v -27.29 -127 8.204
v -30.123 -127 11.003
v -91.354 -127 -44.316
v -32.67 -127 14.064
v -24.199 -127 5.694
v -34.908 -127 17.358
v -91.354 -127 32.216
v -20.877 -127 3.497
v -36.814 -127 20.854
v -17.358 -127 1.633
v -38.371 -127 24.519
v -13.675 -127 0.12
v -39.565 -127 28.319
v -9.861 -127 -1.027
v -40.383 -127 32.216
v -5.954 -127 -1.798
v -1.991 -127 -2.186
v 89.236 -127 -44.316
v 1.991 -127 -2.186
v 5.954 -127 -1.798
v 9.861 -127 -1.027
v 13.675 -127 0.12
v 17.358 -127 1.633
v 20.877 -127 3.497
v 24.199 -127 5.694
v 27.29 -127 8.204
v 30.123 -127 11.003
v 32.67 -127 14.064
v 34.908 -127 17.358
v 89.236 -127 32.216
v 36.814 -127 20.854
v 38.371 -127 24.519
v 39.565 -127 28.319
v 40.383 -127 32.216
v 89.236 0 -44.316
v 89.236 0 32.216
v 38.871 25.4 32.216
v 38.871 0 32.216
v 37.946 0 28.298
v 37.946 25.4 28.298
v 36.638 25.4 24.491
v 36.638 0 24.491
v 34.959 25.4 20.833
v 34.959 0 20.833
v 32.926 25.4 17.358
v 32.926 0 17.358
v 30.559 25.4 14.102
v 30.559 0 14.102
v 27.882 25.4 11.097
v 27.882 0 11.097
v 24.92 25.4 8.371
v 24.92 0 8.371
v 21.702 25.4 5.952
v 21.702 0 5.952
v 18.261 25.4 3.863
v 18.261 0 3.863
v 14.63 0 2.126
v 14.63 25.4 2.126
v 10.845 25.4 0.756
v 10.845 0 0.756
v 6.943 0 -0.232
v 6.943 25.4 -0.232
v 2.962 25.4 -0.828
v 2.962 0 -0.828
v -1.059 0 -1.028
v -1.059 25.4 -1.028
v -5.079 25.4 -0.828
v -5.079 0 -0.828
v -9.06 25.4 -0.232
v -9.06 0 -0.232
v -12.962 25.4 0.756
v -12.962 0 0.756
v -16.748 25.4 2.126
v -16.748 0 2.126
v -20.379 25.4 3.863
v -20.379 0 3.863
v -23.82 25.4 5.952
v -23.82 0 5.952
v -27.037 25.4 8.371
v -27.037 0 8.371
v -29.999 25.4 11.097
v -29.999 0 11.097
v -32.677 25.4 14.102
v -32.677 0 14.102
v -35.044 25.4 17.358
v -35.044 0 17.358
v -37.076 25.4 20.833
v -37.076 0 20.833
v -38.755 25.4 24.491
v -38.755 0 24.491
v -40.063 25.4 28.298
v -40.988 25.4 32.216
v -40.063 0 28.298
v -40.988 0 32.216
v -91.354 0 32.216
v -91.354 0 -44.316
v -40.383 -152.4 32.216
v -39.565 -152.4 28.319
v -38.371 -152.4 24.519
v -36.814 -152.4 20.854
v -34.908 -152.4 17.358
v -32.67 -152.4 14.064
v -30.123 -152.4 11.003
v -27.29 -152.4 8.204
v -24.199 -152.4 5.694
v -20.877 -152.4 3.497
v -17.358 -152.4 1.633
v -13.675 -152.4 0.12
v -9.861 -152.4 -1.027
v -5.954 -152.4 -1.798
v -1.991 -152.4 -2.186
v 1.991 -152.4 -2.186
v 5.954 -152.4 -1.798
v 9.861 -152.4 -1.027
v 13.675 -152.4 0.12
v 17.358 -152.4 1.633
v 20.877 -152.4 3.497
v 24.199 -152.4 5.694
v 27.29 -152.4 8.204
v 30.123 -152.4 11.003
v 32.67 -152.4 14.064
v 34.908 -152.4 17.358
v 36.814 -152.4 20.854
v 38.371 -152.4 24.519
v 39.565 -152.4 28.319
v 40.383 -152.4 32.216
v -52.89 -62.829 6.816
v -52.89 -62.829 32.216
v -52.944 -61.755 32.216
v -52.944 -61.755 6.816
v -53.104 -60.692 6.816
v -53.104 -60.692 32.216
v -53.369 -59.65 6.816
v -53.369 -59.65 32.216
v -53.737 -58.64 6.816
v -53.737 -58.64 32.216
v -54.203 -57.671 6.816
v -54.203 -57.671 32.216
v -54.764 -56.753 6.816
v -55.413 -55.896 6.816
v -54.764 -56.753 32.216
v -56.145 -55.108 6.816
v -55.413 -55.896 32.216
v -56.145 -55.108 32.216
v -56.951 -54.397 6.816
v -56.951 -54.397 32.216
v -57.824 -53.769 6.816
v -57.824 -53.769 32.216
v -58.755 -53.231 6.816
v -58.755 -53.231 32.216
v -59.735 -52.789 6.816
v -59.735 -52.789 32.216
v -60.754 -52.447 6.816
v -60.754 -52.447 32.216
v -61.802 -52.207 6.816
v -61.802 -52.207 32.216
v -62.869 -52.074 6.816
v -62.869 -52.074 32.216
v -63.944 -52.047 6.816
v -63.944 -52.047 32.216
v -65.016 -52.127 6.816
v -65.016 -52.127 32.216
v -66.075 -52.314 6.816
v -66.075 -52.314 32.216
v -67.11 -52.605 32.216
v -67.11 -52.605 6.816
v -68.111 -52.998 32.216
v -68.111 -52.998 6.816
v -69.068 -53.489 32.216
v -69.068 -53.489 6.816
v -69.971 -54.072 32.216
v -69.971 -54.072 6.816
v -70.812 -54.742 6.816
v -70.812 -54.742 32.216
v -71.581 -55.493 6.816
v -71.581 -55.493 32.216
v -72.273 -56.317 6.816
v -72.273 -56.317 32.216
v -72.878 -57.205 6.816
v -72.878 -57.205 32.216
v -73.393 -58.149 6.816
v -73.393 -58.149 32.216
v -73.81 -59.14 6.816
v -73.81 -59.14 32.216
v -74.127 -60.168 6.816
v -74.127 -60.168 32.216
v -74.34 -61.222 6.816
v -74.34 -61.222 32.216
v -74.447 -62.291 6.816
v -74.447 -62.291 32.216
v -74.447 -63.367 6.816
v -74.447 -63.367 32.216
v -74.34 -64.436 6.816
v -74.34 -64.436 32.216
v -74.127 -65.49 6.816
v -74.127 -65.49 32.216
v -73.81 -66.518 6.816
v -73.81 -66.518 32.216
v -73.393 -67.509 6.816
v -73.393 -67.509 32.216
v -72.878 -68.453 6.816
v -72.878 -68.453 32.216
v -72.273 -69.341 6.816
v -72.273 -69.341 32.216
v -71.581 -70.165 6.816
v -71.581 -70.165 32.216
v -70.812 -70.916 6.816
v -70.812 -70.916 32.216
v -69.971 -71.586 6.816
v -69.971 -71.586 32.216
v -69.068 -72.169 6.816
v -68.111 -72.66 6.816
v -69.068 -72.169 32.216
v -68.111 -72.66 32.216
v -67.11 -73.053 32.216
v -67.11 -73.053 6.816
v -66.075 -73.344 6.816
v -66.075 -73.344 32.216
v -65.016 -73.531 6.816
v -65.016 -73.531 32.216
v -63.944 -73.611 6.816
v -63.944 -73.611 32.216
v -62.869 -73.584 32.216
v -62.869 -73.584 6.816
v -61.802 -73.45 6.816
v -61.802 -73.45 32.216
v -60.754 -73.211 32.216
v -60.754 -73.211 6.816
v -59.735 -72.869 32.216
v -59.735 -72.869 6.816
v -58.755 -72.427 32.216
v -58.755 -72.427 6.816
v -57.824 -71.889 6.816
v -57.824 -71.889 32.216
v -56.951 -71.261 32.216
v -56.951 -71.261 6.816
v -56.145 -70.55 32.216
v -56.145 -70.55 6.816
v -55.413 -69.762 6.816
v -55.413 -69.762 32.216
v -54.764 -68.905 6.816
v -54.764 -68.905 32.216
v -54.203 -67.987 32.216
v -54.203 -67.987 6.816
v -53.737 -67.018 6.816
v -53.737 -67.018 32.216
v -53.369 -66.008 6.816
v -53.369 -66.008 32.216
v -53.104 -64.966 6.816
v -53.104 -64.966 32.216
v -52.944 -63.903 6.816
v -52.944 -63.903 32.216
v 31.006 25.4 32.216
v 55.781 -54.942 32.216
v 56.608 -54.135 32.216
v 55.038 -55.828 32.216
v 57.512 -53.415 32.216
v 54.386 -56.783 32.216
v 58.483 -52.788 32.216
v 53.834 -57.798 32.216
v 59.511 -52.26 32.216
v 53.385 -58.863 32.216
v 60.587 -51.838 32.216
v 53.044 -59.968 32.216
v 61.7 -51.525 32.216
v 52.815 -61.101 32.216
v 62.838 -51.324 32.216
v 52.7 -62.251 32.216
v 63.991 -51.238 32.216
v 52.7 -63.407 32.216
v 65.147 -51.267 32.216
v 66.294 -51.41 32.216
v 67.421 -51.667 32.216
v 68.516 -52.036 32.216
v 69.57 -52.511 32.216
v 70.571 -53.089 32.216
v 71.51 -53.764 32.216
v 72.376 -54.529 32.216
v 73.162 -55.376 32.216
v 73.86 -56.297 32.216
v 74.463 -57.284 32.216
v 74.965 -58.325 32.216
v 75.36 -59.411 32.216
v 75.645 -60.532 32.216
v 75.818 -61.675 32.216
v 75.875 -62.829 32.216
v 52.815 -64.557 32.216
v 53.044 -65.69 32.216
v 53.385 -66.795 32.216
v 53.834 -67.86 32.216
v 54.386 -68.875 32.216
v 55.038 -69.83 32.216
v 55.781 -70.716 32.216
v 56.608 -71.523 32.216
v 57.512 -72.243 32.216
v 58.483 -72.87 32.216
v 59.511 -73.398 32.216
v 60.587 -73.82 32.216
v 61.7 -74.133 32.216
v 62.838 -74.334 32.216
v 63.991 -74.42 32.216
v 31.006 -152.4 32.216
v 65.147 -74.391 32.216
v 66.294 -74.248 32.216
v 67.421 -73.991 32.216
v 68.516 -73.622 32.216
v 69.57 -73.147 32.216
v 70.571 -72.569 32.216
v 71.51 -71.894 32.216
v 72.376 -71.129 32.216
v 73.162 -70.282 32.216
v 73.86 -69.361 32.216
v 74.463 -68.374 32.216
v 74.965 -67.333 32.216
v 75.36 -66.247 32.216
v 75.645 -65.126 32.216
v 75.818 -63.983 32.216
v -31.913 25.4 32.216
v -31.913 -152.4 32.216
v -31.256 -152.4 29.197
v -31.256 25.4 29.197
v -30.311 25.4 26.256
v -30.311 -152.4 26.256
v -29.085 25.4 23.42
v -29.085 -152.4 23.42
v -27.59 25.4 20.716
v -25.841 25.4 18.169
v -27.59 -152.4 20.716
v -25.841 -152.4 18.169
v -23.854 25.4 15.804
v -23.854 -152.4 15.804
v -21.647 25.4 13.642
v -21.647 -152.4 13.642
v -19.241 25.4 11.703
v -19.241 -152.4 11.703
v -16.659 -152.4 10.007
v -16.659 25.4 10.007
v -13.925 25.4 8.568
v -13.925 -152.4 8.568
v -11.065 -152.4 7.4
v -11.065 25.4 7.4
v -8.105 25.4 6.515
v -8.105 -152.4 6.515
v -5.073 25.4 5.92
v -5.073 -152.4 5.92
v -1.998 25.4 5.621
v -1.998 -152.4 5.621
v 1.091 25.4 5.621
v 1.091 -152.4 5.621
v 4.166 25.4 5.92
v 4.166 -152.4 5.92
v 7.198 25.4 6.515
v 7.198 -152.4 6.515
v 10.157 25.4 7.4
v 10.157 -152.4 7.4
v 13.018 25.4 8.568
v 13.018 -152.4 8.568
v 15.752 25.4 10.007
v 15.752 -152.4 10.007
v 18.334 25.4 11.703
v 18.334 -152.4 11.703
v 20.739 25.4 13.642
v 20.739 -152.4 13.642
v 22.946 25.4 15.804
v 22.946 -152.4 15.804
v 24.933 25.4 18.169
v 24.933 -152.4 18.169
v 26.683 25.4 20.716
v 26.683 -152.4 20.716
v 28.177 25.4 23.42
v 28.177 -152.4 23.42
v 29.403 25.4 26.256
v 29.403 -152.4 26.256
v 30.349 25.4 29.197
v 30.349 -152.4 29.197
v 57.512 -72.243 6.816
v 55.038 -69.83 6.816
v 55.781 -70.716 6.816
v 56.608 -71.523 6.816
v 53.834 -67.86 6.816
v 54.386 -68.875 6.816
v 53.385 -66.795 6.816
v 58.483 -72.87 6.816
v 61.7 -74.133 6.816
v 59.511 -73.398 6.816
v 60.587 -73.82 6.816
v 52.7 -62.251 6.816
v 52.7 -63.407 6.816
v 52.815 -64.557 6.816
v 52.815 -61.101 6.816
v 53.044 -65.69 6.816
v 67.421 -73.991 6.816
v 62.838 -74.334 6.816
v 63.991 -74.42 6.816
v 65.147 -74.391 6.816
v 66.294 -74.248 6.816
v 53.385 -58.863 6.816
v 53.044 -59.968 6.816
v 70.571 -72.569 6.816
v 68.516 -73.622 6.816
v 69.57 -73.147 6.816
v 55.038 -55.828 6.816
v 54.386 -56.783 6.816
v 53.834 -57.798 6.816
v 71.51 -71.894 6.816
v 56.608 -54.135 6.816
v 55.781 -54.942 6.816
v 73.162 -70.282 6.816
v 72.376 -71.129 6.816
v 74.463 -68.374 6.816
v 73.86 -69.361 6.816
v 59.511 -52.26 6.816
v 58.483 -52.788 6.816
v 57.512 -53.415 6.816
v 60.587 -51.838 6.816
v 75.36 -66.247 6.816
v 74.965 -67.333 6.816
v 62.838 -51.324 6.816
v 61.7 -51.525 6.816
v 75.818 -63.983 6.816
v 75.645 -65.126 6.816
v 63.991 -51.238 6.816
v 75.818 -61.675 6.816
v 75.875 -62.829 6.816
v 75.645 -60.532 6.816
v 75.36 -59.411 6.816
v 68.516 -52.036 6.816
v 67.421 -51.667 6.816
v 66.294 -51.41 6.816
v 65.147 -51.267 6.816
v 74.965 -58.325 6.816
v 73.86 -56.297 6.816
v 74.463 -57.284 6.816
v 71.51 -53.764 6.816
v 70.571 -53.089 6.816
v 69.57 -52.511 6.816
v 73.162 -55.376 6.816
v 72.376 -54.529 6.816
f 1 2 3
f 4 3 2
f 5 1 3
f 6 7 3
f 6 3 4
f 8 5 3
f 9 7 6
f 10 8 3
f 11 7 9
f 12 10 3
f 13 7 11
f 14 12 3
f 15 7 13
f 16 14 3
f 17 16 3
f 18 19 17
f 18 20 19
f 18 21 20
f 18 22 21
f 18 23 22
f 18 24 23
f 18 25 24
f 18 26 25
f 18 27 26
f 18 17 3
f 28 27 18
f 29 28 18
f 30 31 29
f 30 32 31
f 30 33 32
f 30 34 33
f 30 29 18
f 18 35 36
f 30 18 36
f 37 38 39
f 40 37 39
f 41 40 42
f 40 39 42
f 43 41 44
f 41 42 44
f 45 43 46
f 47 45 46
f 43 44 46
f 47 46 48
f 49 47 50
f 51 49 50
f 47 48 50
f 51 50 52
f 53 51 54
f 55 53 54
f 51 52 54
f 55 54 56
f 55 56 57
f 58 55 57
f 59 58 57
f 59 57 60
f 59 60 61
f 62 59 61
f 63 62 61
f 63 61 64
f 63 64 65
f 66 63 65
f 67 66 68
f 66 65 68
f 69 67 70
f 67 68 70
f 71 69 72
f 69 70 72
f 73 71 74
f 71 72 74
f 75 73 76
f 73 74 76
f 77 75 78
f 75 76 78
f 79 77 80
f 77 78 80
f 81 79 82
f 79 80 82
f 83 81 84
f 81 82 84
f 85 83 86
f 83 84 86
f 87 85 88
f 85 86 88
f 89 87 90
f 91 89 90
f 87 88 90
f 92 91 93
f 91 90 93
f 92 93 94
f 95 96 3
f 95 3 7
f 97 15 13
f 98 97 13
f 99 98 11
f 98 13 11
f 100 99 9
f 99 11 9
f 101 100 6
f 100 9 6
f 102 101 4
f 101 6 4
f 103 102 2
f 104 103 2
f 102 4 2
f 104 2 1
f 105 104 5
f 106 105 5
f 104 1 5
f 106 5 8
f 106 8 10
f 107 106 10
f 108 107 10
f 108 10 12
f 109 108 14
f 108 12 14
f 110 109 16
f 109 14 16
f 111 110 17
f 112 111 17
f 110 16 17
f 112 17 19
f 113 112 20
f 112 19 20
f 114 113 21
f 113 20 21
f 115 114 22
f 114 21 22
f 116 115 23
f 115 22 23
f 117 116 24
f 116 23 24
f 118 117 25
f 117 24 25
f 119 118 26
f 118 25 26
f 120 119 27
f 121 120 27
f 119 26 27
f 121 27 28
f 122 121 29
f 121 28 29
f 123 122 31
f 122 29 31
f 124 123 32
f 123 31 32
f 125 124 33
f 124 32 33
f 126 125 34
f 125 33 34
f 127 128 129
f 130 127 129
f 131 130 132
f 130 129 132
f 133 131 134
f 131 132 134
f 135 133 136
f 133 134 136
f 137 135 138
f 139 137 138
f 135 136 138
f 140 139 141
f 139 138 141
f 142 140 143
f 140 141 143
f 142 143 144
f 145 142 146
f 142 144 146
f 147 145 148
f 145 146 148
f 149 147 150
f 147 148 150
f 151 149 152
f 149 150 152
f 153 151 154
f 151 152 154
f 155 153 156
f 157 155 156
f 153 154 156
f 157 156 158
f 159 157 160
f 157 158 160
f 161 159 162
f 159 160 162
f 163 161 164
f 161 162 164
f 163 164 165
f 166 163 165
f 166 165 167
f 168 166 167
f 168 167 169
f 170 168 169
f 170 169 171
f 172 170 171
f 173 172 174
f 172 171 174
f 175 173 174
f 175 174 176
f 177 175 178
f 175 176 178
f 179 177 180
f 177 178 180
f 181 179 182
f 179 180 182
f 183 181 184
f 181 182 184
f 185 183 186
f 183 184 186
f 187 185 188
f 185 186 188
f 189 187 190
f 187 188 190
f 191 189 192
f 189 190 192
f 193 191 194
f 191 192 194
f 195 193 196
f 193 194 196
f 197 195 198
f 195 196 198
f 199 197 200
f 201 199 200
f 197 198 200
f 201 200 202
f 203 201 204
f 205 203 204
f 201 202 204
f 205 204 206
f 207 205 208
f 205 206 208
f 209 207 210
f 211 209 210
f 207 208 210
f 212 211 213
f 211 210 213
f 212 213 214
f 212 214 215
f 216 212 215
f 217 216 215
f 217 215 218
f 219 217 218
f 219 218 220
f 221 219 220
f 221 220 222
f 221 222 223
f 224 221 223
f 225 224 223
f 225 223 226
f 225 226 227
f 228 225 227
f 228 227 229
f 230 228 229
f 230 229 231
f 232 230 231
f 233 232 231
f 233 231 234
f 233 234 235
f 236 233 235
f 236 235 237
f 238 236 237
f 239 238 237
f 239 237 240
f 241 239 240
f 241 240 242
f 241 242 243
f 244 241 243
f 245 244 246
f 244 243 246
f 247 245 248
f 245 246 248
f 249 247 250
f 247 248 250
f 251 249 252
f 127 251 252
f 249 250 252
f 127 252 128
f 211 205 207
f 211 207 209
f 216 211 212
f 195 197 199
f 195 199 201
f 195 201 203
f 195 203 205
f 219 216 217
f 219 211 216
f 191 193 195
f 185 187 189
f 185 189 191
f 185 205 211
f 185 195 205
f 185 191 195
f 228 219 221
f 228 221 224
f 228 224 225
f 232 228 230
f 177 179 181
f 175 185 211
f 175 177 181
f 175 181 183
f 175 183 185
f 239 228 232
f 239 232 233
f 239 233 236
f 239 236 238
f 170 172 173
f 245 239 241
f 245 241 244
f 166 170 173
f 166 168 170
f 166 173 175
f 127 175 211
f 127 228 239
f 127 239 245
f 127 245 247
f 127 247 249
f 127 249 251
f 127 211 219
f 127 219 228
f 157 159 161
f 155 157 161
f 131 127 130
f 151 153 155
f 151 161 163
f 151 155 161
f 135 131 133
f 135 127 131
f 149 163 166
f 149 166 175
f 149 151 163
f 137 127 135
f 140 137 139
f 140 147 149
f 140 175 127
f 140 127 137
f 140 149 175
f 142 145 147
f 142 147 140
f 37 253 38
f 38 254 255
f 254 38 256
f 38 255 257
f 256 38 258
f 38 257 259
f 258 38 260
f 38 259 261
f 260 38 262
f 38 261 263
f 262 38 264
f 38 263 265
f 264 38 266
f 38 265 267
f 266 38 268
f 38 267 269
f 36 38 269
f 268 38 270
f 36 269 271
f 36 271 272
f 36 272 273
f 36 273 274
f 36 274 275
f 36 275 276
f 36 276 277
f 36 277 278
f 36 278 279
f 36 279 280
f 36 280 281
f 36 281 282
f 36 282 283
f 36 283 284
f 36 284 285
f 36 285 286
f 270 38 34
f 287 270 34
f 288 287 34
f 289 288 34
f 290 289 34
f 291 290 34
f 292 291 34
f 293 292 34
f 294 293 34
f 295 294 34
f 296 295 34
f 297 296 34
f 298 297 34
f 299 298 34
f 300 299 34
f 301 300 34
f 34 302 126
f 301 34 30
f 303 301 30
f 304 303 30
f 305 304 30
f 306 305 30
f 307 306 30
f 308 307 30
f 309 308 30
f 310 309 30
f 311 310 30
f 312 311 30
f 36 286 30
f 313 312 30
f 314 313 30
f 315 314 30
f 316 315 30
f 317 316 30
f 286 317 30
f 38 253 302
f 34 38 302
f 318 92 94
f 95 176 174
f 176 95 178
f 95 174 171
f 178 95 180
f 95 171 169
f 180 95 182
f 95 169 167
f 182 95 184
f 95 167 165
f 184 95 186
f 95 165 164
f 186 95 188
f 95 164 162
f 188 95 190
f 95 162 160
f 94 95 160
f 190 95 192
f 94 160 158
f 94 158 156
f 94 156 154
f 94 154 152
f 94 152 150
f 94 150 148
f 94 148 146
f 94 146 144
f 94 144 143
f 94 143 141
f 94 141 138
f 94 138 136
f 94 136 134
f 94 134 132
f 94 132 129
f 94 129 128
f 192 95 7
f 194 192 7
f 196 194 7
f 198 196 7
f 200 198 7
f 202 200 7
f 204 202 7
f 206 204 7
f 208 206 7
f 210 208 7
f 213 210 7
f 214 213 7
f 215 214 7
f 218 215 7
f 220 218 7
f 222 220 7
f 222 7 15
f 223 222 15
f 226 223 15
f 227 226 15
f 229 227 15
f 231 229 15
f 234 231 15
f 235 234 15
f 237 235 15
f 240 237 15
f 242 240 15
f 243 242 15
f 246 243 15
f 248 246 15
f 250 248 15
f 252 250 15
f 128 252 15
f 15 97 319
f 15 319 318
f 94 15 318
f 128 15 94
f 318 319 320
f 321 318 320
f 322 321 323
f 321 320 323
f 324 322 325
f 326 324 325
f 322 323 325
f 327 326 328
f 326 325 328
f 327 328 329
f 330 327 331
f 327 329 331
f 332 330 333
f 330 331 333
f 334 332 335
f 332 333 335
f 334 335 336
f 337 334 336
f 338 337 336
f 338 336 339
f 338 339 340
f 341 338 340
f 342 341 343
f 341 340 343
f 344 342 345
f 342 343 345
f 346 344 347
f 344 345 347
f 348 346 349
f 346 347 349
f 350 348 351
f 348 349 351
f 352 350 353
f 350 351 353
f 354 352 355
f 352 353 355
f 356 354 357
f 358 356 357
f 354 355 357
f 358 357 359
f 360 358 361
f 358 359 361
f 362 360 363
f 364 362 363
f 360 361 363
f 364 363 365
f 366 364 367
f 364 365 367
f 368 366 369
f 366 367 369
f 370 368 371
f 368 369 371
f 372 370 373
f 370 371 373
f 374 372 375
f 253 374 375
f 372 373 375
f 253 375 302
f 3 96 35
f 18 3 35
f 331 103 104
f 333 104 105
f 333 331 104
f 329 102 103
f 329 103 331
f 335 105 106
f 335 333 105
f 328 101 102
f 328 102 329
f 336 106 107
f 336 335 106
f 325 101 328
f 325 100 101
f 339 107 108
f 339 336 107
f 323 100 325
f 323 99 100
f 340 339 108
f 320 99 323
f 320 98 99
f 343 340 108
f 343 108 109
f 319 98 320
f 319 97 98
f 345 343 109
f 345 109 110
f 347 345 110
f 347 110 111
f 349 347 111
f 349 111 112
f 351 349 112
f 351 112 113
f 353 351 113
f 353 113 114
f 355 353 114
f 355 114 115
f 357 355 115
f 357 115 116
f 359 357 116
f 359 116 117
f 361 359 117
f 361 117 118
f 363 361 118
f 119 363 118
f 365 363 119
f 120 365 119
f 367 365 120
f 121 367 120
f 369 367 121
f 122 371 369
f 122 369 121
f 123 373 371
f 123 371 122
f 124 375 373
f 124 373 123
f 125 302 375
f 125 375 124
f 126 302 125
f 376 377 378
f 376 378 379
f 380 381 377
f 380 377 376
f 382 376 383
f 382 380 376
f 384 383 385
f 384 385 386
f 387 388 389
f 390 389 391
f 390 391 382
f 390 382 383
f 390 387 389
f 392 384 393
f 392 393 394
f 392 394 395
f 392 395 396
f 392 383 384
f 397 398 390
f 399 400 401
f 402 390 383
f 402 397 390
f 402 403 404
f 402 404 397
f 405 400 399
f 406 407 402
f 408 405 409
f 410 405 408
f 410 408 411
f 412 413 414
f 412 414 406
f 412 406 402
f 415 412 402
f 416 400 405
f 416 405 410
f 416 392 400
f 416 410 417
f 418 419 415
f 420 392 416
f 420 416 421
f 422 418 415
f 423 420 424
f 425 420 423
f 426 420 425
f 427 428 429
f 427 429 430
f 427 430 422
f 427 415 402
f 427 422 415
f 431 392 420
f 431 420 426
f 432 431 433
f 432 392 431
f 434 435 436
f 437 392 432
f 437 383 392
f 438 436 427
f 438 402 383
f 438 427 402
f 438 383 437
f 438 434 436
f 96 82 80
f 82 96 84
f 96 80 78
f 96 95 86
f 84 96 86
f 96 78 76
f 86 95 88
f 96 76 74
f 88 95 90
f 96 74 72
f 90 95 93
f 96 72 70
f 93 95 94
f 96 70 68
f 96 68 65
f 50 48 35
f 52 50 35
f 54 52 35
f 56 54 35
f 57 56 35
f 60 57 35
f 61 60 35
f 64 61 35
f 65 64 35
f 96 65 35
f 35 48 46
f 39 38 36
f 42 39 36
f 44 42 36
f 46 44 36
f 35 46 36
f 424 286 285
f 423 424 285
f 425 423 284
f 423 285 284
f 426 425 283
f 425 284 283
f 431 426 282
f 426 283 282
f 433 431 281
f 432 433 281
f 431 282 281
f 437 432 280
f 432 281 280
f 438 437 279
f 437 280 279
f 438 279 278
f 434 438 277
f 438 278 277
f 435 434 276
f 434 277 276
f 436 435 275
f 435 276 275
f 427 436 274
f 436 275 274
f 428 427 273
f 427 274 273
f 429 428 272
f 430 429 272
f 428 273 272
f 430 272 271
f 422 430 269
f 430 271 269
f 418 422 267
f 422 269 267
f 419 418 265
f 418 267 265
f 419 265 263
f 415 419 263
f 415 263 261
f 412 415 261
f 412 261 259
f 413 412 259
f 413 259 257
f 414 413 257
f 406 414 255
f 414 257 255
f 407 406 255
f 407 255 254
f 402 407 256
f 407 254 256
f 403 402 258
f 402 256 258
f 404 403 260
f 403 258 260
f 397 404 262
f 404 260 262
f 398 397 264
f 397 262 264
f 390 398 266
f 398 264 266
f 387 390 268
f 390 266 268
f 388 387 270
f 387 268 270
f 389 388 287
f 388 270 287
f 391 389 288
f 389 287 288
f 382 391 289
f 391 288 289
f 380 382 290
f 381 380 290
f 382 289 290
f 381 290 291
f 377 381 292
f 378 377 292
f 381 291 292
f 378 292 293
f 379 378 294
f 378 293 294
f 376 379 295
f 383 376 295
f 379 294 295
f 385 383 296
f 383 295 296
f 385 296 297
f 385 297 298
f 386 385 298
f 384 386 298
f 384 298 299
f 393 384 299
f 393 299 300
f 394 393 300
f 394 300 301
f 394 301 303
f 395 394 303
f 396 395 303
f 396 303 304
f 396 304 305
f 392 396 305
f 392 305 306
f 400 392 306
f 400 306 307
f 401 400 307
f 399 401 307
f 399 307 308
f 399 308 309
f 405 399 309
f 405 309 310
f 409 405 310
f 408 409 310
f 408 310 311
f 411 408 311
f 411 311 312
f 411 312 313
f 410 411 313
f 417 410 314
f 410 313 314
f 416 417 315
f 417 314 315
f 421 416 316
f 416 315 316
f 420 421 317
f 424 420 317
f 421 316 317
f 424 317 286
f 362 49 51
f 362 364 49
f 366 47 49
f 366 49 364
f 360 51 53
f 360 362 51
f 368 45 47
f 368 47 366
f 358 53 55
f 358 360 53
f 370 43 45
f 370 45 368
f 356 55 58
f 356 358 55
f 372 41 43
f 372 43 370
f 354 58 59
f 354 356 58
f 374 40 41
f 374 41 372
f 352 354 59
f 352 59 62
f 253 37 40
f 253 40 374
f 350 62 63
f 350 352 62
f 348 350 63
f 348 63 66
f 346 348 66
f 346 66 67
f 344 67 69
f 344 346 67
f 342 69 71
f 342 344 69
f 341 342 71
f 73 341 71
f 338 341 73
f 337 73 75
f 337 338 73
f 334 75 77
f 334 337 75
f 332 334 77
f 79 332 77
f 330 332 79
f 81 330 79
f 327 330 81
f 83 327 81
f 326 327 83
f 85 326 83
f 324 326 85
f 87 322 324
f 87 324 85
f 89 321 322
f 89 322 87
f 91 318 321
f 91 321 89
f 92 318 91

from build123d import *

# Parameters (mm, degrees)
F0_W      = 180.589676
F0_H      = 76.531302
F1_DEPTH  = 127
F4_DEPTH  = 127.001
F6_DEPTH  = 25.4
F8_DEPTH  = 25.4
F9_R      = 10.785345
F9_R_2    = 11.594885
F10_DEPTH = 25.4


with BuildPart() as f1:
    # F0 (on Front) → F1 (new body)
    with BuildSketch(Plane.XZ):
        with Locations((-1.058735, -6.049903)):
            Rectangle(F0_W, F0_H)
    extrude(amount=F1_DEPTH)

    # F2 (on face) → F4 (cut, through all)
    with BuildSketch(Plane.XZ.offset(127)):
        with BuildLine():
            Line((31.005763, 32.215748), (-31.913254, 32.215748))
            ThreePointArc((-31.913254, 32.215748), (-0.453746, 5.58325), (31.005763, 32.215748))
        make_face()
    extrude(amount=-F4_DEPTH, mode=Mode.SUBTRACT)

    # F3 (on face) → F6 (join)
    with BuildSketch(Plane.XZ.offset(127)):
        with BuildLine():
            ThreePointArc((31.005763, 32.215748), (-0.453746, 5.58325), (-31.913254, 32.215748))
            Line((-31.913254, 32.215748), (-40.383123, 32.215748))
            ThreePointArc((-40.383123, 32.215748), (-2e-06, -2.234087), (40.383119, 32.215748))
            Line((40.383119, 32.215748), (31.005763, 32.215748))
        make_face()
    extrude(amount=F6_DEPTH)

    # F7 (on face) → F8 (join)
    with BuildSketch(Plane(origin=(0, 0, 0), x_dir=(-1, 0, 0), z_dir=(0, 1, 0))):
        with BuildLine():
            Line((-31.005763, 32.215748), (-38.87064, 32.215748))
            ThreePointArc((-38.87064, 32.215748), (1.058737, -1.02799), (40.988114, 32.215748))
            Line((40.988114, 32.215748), (31.913254, 32.215748))
            ThreePointArc((31.913254, 32.215748), (0.453746, 5.58325), (-31.005763, 32.215748))
        make_face()
    extrude(amount=F8_DEPTH)

    # F9 (on face) → F10 (cut)
    with BuildSketch(Plane.XY.offset(32.215748)):
        with Locations((-63.675255, -62.828988)):
            Circle(F9_R)
        with Locations((64.280249, -62.828988)):
            Circle(F9_R_2)
    extrude(amount=-F10_DEPTH, mode=Mode.SUBTRACT)


solid = f1.part
